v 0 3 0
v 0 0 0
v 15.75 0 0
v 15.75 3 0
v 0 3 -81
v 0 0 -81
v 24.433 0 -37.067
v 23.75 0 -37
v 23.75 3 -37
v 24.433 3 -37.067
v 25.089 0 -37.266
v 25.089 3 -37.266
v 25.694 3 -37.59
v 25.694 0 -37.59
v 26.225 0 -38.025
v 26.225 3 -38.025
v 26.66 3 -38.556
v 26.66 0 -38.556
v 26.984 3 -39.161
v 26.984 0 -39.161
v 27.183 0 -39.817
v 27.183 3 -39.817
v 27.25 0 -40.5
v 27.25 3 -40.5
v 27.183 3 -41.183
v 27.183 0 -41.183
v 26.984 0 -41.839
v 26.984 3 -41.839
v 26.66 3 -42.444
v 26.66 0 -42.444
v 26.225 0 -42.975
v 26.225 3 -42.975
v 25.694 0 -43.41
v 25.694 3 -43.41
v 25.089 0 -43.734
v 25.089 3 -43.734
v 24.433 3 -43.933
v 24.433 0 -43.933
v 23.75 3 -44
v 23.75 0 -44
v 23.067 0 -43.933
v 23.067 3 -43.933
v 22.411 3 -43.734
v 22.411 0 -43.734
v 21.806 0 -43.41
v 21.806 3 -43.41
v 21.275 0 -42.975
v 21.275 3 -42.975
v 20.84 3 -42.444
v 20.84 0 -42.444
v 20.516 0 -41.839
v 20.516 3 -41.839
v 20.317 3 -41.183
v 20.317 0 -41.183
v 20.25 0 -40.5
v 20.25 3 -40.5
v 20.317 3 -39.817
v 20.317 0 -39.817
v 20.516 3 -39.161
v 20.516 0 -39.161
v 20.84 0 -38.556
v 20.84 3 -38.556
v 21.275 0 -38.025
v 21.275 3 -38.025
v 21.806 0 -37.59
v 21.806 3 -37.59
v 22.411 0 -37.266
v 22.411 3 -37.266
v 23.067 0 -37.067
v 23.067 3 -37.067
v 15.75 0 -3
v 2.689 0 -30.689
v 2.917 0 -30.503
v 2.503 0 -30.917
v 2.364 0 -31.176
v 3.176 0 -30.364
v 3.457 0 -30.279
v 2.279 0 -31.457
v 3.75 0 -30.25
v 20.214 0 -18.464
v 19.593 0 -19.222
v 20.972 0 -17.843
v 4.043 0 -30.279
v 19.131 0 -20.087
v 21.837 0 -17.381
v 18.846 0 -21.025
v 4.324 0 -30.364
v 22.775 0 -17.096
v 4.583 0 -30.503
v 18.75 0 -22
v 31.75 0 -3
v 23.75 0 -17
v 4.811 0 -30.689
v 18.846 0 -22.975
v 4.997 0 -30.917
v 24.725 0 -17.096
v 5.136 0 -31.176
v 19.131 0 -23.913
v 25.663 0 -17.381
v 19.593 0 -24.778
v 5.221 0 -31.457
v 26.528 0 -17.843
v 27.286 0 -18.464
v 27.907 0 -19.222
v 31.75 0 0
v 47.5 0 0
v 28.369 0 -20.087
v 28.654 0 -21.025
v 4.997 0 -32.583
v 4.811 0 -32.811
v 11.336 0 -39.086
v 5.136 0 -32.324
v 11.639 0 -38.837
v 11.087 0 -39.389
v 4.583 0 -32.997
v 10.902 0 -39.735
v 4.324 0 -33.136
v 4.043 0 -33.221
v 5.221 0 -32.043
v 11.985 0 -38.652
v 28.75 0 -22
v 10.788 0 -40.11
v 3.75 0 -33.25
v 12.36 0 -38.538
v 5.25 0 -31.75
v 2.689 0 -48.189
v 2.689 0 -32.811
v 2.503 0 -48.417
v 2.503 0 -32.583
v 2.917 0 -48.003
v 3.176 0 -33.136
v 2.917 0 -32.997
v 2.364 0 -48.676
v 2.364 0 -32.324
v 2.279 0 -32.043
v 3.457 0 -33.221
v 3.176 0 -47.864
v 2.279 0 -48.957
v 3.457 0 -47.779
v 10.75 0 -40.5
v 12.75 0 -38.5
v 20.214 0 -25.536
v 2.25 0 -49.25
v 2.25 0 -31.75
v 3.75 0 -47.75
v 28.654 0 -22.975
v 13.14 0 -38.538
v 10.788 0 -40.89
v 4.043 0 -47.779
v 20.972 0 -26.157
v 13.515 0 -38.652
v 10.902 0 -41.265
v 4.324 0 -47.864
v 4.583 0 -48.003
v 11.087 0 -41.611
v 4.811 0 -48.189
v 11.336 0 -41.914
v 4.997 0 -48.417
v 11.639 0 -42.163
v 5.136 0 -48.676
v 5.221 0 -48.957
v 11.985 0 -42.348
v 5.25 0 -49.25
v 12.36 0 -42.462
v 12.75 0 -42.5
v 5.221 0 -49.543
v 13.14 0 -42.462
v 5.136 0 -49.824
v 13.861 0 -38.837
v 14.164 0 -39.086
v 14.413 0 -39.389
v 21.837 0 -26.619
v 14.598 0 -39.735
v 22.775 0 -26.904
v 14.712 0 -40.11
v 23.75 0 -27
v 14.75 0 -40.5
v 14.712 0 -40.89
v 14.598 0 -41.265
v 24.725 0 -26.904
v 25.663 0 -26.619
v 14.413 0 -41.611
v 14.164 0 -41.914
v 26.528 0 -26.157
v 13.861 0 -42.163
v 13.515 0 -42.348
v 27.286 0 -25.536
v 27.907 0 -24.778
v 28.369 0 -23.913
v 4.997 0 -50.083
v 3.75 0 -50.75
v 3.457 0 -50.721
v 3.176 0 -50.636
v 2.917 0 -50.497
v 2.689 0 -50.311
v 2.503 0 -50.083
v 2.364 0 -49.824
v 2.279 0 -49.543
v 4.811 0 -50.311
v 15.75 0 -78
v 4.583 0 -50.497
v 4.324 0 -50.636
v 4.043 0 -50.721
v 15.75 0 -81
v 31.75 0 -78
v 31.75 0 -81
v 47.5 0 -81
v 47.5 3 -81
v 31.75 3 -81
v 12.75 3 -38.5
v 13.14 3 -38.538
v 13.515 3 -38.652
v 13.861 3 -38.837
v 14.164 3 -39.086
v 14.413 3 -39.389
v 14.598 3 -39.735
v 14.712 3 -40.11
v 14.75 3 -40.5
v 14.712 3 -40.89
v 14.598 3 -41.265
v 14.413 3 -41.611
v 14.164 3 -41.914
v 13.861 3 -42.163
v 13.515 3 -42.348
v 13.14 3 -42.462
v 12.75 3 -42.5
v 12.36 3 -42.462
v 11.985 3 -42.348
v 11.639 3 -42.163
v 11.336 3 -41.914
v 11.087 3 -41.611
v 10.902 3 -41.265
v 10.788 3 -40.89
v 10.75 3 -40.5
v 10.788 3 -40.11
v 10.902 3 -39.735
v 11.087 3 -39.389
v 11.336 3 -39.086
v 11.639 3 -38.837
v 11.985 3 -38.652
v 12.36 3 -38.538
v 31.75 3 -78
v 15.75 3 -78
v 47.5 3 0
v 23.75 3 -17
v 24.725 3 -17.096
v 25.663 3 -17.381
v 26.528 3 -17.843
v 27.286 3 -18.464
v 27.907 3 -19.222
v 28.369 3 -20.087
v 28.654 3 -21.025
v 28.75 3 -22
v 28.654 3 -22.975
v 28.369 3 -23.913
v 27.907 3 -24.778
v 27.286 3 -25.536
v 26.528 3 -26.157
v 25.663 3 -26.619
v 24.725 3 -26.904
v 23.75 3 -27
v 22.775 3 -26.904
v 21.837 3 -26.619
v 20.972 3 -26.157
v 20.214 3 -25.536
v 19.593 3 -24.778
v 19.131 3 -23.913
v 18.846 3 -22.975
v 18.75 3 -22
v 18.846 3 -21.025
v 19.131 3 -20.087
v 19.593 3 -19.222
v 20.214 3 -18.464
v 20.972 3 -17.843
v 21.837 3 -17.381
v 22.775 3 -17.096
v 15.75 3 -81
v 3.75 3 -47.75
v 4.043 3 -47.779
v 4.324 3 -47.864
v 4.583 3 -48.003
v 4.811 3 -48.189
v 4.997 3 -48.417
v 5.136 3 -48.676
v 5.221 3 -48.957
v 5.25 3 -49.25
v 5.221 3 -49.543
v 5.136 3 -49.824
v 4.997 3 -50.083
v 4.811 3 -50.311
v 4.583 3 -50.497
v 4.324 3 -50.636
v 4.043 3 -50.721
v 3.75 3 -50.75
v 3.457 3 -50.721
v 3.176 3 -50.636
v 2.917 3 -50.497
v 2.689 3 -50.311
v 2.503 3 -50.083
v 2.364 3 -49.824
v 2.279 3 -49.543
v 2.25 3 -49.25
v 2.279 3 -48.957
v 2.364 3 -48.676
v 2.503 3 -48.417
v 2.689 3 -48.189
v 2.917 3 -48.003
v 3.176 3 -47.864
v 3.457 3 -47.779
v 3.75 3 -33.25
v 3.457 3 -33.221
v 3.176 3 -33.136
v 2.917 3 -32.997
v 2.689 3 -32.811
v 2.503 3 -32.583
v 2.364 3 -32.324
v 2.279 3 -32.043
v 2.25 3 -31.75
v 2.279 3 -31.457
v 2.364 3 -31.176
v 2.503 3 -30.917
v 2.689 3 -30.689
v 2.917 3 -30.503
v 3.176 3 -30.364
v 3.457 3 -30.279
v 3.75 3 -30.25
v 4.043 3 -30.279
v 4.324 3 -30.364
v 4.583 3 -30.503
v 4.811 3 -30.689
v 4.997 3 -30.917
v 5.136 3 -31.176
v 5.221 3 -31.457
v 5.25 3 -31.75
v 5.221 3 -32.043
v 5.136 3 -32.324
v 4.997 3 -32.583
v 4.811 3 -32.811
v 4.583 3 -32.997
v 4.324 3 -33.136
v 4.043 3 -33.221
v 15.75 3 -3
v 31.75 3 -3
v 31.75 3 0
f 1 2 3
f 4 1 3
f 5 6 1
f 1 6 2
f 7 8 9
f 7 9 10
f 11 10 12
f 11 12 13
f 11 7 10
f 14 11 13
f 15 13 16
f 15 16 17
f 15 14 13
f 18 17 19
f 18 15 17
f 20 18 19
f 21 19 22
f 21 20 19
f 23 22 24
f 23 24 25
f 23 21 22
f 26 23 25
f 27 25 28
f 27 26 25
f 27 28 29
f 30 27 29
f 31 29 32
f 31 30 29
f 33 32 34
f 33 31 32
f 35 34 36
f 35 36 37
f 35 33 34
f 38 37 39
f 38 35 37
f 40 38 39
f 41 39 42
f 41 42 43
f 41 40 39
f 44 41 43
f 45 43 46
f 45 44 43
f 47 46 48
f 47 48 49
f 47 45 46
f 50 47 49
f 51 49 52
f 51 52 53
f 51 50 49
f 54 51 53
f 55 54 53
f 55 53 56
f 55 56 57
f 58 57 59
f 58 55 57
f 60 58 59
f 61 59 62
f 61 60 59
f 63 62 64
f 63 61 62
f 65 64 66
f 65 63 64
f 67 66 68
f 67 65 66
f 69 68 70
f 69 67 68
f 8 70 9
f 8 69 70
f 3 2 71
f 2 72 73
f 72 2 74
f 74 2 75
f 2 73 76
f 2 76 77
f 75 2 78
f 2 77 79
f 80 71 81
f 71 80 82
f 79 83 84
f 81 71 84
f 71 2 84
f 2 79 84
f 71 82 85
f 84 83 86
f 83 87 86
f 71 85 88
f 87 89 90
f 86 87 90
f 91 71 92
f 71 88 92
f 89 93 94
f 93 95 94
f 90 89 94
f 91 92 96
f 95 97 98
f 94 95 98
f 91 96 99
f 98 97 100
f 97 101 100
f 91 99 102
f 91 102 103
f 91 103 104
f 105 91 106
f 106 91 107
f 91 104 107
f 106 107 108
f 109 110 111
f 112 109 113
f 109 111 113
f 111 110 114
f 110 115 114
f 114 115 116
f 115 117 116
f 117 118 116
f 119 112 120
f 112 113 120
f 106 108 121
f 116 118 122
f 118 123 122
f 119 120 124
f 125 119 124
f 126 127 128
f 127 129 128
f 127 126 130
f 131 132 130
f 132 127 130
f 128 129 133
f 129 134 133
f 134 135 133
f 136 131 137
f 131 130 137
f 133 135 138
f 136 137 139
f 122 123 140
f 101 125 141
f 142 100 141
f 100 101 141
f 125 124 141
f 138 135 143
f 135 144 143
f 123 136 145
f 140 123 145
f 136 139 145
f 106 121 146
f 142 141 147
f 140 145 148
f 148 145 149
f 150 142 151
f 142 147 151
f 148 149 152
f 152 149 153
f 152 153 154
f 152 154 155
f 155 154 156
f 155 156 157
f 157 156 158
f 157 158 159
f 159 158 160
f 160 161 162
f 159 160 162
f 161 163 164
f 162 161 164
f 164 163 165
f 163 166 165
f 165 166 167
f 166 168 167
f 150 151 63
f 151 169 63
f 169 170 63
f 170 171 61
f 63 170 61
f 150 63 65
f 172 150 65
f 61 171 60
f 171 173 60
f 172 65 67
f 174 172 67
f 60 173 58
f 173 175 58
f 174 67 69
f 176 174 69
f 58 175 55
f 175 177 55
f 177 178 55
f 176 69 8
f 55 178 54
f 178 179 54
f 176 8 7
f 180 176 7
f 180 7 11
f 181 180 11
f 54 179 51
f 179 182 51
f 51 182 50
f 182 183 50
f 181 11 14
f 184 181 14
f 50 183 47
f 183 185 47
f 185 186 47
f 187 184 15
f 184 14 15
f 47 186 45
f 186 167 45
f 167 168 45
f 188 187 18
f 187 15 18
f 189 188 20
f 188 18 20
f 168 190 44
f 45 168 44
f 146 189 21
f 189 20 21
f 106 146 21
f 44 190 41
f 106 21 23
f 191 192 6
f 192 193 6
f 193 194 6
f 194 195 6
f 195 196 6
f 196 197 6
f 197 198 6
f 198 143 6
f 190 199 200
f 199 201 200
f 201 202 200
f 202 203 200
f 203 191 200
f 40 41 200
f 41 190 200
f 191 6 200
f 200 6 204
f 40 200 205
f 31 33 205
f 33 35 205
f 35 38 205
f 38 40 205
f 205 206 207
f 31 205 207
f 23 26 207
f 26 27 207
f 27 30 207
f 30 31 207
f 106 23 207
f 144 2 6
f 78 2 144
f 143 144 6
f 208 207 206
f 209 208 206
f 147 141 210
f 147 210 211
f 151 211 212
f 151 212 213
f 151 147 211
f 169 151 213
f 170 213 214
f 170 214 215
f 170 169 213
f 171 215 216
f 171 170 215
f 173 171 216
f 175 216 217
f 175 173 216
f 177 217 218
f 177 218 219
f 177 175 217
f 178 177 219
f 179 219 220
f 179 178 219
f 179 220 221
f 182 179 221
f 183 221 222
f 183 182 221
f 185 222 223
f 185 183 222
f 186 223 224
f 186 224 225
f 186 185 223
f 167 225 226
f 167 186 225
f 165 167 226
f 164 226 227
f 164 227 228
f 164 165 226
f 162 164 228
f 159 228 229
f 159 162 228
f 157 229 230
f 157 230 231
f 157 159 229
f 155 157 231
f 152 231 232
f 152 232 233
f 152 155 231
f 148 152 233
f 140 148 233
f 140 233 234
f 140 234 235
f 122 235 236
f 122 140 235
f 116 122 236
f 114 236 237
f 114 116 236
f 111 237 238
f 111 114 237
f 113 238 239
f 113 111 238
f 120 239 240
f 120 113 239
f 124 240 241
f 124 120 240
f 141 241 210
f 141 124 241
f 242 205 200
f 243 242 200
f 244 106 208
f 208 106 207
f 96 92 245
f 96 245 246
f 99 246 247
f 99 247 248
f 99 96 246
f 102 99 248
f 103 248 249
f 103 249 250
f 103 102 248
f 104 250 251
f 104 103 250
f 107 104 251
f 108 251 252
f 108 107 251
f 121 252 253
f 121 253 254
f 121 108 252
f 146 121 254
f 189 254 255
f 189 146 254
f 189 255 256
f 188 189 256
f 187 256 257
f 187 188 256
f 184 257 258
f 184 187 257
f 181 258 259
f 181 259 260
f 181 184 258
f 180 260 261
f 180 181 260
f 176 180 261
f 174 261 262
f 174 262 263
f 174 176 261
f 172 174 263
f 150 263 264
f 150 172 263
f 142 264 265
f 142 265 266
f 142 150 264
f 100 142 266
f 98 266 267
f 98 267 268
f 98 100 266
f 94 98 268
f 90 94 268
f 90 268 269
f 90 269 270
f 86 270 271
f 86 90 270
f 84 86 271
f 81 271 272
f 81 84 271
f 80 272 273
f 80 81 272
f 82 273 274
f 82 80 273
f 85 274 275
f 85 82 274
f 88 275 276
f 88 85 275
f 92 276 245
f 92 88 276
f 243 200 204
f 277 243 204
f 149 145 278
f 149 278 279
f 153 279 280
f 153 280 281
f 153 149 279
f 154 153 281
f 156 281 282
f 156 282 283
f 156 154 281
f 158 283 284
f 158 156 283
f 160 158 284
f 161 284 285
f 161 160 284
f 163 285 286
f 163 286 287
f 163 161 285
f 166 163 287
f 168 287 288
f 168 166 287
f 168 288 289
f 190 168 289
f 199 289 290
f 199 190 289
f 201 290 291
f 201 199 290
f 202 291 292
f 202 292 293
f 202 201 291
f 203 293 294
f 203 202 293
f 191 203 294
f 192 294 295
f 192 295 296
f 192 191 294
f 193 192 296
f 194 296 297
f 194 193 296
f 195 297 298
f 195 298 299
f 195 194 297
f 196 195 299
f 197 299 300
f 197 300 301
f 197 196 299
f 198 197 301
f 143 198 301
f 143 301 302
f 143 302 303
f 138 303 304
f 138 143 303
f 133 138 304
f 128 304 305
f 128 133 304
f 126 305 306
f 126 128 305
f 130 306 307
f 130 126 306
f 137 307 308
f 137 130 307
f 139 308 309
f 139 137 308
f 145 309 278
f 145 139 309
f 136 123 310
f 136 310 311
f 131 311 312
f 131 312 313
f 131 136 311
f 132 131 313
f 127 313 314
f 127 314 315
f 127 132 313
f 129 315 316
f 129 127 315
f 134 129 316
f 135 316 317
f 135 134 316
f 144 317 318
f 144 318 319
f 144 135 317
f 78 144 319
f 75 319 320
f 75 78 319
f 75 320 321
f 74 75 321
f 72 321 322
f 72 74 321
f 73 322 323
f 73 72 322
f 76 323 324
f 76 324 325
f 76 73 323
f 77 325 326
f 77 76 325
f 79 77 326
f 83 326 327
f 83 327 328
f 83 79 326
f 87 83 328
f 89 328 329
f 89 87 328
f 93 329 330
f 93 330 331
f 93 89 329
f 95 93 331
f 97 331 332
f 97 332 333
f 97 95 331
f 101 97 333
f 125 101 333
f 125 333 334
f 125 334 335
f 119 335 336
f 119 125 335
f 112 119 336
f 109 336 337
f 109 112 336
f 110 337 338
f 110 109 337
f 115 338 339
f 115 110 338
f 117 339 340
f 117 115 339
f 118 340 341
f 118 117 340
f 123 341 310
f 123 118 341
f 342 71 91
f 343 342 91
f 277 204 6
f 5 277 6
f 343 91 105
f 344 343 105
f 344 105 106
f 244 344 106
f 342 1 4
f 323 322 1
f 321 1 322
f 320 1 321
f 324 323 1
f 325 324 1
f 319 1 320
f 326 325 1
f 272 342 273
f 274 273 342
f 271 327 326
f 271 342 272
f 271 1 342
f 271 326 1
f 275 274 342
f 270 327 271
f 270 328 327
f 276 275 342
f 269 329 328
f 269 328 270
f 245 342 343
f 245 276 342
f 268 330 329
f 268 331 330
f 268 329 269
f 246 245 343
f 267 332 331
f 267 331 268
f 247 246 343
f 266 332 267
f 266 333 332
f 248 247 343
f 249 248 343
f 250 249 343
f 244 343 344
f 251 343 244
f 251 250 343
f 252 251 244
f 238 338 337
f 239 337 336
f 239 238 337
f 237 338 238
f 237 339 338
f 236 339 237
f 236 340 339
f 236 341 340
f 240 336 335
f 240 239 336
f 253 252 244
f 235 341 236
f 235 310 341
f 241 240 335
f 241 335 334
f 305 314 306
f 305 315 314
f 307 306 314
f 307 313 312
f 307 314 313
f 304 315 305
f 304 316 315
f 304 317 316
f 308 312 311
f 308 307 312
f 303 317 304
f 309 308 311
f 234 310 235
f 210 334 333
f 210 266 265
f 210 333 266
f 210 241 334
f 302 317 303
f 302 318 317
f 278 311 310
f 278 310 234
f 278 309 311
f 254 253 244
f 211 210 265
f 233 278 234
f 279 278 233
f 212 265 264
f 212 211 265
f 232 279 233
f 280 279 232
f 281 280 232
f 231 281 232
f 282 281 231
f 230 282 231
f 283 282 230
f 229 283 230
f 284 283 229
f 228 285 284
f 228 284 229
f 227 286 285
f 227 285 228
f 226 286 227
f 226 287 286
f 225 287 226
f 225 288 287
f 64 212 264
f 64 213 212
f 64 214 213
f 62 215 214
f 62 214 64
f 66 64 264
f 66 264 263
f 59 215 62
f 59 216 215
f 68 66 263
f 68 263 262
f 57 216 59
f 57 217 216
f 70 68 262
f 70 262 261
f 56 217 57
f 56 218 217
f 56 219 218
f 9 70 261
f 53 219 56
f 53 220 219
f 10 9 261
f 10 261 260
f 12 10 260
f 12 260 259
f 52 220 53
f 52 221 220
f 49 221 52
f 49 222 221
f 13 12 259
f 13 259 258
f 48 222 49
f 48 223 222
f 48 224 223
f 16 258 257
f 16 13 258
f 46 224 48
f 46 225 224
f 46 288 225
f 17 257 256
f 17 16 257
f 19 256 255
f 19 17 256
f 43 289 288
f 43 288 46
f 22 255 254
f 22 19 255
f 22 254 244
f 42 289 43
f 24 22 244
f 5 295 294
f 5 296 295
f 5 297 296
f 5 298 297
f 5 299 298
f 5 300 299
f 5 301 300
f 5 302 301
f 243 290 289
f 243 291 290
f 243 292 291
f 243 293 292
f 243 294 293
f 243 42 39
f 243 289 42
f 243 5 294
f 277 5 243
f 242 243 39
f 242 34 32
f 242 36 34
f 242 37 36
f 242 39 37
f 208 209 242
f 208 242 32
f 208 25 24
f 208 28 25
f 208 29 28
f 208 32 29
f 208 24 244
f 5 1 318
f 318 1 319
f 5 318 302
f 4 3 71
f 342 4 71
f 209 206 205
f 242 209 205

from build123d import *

# Parameters (mm, degrees)
CROQUIS1_R              = 1.5
CROQUIS1_R_2            = 2
CROQUIS1_R_3            = 5
CROQUIS1_R_4            = 3.5
SALIENTE_EXTRUIR1_DEPTH = 3


with BuildPart() as part:
    # Croquis1 → Saliente-Extruir1 (new body)
    with BuildSketch(Plane(origin=(0, 0, 0), x_dir=(1, 0, 0), z_dir=(0, 1, 0))):
        Polygon((0, 0), (15.75, 0), (15.75, 3), (23.75, 3), (31.75, 3), (31.75, 0), (47.5, 0), (47.5, 81), (31.75, 81), (31.75, 78), (23.75, 78), (15.75, 78), (15.75, 81), (0, 81), align=None)
        with Locations(Location((3.75, 49.25, 0), (0, 0, 270))):
            Circle(CROQUIS1_R, mode=Mode.SUBTRACT)
        with Locations(Location((3.75, 31.75, 0), (0, 0, 90))):
            Circle(CROQUIS1_R, mode=Mode.SUBTRACT)
        with Locations(Location((12.75, 40.5, 0), (0, 0, 270))):
            Circle(CROQUIS1_R_2, mode=Mode.SUBTRACT)
        with Locations(Location((23.75, 22, 0), (0, 0, 270))):
            Circle(CROQUIS1_R_3, mode=Mode.SUBTRACT)
        with Locations(Location((23.75, 40.5, 0), (0, 0, 270))):
            Circle(CROQUIS1_R_4, mode=Mode.SUBTRACT)
    extrude(amount=SALIENTE_EXTRUIR1_DEPTH)


solid = part.part
